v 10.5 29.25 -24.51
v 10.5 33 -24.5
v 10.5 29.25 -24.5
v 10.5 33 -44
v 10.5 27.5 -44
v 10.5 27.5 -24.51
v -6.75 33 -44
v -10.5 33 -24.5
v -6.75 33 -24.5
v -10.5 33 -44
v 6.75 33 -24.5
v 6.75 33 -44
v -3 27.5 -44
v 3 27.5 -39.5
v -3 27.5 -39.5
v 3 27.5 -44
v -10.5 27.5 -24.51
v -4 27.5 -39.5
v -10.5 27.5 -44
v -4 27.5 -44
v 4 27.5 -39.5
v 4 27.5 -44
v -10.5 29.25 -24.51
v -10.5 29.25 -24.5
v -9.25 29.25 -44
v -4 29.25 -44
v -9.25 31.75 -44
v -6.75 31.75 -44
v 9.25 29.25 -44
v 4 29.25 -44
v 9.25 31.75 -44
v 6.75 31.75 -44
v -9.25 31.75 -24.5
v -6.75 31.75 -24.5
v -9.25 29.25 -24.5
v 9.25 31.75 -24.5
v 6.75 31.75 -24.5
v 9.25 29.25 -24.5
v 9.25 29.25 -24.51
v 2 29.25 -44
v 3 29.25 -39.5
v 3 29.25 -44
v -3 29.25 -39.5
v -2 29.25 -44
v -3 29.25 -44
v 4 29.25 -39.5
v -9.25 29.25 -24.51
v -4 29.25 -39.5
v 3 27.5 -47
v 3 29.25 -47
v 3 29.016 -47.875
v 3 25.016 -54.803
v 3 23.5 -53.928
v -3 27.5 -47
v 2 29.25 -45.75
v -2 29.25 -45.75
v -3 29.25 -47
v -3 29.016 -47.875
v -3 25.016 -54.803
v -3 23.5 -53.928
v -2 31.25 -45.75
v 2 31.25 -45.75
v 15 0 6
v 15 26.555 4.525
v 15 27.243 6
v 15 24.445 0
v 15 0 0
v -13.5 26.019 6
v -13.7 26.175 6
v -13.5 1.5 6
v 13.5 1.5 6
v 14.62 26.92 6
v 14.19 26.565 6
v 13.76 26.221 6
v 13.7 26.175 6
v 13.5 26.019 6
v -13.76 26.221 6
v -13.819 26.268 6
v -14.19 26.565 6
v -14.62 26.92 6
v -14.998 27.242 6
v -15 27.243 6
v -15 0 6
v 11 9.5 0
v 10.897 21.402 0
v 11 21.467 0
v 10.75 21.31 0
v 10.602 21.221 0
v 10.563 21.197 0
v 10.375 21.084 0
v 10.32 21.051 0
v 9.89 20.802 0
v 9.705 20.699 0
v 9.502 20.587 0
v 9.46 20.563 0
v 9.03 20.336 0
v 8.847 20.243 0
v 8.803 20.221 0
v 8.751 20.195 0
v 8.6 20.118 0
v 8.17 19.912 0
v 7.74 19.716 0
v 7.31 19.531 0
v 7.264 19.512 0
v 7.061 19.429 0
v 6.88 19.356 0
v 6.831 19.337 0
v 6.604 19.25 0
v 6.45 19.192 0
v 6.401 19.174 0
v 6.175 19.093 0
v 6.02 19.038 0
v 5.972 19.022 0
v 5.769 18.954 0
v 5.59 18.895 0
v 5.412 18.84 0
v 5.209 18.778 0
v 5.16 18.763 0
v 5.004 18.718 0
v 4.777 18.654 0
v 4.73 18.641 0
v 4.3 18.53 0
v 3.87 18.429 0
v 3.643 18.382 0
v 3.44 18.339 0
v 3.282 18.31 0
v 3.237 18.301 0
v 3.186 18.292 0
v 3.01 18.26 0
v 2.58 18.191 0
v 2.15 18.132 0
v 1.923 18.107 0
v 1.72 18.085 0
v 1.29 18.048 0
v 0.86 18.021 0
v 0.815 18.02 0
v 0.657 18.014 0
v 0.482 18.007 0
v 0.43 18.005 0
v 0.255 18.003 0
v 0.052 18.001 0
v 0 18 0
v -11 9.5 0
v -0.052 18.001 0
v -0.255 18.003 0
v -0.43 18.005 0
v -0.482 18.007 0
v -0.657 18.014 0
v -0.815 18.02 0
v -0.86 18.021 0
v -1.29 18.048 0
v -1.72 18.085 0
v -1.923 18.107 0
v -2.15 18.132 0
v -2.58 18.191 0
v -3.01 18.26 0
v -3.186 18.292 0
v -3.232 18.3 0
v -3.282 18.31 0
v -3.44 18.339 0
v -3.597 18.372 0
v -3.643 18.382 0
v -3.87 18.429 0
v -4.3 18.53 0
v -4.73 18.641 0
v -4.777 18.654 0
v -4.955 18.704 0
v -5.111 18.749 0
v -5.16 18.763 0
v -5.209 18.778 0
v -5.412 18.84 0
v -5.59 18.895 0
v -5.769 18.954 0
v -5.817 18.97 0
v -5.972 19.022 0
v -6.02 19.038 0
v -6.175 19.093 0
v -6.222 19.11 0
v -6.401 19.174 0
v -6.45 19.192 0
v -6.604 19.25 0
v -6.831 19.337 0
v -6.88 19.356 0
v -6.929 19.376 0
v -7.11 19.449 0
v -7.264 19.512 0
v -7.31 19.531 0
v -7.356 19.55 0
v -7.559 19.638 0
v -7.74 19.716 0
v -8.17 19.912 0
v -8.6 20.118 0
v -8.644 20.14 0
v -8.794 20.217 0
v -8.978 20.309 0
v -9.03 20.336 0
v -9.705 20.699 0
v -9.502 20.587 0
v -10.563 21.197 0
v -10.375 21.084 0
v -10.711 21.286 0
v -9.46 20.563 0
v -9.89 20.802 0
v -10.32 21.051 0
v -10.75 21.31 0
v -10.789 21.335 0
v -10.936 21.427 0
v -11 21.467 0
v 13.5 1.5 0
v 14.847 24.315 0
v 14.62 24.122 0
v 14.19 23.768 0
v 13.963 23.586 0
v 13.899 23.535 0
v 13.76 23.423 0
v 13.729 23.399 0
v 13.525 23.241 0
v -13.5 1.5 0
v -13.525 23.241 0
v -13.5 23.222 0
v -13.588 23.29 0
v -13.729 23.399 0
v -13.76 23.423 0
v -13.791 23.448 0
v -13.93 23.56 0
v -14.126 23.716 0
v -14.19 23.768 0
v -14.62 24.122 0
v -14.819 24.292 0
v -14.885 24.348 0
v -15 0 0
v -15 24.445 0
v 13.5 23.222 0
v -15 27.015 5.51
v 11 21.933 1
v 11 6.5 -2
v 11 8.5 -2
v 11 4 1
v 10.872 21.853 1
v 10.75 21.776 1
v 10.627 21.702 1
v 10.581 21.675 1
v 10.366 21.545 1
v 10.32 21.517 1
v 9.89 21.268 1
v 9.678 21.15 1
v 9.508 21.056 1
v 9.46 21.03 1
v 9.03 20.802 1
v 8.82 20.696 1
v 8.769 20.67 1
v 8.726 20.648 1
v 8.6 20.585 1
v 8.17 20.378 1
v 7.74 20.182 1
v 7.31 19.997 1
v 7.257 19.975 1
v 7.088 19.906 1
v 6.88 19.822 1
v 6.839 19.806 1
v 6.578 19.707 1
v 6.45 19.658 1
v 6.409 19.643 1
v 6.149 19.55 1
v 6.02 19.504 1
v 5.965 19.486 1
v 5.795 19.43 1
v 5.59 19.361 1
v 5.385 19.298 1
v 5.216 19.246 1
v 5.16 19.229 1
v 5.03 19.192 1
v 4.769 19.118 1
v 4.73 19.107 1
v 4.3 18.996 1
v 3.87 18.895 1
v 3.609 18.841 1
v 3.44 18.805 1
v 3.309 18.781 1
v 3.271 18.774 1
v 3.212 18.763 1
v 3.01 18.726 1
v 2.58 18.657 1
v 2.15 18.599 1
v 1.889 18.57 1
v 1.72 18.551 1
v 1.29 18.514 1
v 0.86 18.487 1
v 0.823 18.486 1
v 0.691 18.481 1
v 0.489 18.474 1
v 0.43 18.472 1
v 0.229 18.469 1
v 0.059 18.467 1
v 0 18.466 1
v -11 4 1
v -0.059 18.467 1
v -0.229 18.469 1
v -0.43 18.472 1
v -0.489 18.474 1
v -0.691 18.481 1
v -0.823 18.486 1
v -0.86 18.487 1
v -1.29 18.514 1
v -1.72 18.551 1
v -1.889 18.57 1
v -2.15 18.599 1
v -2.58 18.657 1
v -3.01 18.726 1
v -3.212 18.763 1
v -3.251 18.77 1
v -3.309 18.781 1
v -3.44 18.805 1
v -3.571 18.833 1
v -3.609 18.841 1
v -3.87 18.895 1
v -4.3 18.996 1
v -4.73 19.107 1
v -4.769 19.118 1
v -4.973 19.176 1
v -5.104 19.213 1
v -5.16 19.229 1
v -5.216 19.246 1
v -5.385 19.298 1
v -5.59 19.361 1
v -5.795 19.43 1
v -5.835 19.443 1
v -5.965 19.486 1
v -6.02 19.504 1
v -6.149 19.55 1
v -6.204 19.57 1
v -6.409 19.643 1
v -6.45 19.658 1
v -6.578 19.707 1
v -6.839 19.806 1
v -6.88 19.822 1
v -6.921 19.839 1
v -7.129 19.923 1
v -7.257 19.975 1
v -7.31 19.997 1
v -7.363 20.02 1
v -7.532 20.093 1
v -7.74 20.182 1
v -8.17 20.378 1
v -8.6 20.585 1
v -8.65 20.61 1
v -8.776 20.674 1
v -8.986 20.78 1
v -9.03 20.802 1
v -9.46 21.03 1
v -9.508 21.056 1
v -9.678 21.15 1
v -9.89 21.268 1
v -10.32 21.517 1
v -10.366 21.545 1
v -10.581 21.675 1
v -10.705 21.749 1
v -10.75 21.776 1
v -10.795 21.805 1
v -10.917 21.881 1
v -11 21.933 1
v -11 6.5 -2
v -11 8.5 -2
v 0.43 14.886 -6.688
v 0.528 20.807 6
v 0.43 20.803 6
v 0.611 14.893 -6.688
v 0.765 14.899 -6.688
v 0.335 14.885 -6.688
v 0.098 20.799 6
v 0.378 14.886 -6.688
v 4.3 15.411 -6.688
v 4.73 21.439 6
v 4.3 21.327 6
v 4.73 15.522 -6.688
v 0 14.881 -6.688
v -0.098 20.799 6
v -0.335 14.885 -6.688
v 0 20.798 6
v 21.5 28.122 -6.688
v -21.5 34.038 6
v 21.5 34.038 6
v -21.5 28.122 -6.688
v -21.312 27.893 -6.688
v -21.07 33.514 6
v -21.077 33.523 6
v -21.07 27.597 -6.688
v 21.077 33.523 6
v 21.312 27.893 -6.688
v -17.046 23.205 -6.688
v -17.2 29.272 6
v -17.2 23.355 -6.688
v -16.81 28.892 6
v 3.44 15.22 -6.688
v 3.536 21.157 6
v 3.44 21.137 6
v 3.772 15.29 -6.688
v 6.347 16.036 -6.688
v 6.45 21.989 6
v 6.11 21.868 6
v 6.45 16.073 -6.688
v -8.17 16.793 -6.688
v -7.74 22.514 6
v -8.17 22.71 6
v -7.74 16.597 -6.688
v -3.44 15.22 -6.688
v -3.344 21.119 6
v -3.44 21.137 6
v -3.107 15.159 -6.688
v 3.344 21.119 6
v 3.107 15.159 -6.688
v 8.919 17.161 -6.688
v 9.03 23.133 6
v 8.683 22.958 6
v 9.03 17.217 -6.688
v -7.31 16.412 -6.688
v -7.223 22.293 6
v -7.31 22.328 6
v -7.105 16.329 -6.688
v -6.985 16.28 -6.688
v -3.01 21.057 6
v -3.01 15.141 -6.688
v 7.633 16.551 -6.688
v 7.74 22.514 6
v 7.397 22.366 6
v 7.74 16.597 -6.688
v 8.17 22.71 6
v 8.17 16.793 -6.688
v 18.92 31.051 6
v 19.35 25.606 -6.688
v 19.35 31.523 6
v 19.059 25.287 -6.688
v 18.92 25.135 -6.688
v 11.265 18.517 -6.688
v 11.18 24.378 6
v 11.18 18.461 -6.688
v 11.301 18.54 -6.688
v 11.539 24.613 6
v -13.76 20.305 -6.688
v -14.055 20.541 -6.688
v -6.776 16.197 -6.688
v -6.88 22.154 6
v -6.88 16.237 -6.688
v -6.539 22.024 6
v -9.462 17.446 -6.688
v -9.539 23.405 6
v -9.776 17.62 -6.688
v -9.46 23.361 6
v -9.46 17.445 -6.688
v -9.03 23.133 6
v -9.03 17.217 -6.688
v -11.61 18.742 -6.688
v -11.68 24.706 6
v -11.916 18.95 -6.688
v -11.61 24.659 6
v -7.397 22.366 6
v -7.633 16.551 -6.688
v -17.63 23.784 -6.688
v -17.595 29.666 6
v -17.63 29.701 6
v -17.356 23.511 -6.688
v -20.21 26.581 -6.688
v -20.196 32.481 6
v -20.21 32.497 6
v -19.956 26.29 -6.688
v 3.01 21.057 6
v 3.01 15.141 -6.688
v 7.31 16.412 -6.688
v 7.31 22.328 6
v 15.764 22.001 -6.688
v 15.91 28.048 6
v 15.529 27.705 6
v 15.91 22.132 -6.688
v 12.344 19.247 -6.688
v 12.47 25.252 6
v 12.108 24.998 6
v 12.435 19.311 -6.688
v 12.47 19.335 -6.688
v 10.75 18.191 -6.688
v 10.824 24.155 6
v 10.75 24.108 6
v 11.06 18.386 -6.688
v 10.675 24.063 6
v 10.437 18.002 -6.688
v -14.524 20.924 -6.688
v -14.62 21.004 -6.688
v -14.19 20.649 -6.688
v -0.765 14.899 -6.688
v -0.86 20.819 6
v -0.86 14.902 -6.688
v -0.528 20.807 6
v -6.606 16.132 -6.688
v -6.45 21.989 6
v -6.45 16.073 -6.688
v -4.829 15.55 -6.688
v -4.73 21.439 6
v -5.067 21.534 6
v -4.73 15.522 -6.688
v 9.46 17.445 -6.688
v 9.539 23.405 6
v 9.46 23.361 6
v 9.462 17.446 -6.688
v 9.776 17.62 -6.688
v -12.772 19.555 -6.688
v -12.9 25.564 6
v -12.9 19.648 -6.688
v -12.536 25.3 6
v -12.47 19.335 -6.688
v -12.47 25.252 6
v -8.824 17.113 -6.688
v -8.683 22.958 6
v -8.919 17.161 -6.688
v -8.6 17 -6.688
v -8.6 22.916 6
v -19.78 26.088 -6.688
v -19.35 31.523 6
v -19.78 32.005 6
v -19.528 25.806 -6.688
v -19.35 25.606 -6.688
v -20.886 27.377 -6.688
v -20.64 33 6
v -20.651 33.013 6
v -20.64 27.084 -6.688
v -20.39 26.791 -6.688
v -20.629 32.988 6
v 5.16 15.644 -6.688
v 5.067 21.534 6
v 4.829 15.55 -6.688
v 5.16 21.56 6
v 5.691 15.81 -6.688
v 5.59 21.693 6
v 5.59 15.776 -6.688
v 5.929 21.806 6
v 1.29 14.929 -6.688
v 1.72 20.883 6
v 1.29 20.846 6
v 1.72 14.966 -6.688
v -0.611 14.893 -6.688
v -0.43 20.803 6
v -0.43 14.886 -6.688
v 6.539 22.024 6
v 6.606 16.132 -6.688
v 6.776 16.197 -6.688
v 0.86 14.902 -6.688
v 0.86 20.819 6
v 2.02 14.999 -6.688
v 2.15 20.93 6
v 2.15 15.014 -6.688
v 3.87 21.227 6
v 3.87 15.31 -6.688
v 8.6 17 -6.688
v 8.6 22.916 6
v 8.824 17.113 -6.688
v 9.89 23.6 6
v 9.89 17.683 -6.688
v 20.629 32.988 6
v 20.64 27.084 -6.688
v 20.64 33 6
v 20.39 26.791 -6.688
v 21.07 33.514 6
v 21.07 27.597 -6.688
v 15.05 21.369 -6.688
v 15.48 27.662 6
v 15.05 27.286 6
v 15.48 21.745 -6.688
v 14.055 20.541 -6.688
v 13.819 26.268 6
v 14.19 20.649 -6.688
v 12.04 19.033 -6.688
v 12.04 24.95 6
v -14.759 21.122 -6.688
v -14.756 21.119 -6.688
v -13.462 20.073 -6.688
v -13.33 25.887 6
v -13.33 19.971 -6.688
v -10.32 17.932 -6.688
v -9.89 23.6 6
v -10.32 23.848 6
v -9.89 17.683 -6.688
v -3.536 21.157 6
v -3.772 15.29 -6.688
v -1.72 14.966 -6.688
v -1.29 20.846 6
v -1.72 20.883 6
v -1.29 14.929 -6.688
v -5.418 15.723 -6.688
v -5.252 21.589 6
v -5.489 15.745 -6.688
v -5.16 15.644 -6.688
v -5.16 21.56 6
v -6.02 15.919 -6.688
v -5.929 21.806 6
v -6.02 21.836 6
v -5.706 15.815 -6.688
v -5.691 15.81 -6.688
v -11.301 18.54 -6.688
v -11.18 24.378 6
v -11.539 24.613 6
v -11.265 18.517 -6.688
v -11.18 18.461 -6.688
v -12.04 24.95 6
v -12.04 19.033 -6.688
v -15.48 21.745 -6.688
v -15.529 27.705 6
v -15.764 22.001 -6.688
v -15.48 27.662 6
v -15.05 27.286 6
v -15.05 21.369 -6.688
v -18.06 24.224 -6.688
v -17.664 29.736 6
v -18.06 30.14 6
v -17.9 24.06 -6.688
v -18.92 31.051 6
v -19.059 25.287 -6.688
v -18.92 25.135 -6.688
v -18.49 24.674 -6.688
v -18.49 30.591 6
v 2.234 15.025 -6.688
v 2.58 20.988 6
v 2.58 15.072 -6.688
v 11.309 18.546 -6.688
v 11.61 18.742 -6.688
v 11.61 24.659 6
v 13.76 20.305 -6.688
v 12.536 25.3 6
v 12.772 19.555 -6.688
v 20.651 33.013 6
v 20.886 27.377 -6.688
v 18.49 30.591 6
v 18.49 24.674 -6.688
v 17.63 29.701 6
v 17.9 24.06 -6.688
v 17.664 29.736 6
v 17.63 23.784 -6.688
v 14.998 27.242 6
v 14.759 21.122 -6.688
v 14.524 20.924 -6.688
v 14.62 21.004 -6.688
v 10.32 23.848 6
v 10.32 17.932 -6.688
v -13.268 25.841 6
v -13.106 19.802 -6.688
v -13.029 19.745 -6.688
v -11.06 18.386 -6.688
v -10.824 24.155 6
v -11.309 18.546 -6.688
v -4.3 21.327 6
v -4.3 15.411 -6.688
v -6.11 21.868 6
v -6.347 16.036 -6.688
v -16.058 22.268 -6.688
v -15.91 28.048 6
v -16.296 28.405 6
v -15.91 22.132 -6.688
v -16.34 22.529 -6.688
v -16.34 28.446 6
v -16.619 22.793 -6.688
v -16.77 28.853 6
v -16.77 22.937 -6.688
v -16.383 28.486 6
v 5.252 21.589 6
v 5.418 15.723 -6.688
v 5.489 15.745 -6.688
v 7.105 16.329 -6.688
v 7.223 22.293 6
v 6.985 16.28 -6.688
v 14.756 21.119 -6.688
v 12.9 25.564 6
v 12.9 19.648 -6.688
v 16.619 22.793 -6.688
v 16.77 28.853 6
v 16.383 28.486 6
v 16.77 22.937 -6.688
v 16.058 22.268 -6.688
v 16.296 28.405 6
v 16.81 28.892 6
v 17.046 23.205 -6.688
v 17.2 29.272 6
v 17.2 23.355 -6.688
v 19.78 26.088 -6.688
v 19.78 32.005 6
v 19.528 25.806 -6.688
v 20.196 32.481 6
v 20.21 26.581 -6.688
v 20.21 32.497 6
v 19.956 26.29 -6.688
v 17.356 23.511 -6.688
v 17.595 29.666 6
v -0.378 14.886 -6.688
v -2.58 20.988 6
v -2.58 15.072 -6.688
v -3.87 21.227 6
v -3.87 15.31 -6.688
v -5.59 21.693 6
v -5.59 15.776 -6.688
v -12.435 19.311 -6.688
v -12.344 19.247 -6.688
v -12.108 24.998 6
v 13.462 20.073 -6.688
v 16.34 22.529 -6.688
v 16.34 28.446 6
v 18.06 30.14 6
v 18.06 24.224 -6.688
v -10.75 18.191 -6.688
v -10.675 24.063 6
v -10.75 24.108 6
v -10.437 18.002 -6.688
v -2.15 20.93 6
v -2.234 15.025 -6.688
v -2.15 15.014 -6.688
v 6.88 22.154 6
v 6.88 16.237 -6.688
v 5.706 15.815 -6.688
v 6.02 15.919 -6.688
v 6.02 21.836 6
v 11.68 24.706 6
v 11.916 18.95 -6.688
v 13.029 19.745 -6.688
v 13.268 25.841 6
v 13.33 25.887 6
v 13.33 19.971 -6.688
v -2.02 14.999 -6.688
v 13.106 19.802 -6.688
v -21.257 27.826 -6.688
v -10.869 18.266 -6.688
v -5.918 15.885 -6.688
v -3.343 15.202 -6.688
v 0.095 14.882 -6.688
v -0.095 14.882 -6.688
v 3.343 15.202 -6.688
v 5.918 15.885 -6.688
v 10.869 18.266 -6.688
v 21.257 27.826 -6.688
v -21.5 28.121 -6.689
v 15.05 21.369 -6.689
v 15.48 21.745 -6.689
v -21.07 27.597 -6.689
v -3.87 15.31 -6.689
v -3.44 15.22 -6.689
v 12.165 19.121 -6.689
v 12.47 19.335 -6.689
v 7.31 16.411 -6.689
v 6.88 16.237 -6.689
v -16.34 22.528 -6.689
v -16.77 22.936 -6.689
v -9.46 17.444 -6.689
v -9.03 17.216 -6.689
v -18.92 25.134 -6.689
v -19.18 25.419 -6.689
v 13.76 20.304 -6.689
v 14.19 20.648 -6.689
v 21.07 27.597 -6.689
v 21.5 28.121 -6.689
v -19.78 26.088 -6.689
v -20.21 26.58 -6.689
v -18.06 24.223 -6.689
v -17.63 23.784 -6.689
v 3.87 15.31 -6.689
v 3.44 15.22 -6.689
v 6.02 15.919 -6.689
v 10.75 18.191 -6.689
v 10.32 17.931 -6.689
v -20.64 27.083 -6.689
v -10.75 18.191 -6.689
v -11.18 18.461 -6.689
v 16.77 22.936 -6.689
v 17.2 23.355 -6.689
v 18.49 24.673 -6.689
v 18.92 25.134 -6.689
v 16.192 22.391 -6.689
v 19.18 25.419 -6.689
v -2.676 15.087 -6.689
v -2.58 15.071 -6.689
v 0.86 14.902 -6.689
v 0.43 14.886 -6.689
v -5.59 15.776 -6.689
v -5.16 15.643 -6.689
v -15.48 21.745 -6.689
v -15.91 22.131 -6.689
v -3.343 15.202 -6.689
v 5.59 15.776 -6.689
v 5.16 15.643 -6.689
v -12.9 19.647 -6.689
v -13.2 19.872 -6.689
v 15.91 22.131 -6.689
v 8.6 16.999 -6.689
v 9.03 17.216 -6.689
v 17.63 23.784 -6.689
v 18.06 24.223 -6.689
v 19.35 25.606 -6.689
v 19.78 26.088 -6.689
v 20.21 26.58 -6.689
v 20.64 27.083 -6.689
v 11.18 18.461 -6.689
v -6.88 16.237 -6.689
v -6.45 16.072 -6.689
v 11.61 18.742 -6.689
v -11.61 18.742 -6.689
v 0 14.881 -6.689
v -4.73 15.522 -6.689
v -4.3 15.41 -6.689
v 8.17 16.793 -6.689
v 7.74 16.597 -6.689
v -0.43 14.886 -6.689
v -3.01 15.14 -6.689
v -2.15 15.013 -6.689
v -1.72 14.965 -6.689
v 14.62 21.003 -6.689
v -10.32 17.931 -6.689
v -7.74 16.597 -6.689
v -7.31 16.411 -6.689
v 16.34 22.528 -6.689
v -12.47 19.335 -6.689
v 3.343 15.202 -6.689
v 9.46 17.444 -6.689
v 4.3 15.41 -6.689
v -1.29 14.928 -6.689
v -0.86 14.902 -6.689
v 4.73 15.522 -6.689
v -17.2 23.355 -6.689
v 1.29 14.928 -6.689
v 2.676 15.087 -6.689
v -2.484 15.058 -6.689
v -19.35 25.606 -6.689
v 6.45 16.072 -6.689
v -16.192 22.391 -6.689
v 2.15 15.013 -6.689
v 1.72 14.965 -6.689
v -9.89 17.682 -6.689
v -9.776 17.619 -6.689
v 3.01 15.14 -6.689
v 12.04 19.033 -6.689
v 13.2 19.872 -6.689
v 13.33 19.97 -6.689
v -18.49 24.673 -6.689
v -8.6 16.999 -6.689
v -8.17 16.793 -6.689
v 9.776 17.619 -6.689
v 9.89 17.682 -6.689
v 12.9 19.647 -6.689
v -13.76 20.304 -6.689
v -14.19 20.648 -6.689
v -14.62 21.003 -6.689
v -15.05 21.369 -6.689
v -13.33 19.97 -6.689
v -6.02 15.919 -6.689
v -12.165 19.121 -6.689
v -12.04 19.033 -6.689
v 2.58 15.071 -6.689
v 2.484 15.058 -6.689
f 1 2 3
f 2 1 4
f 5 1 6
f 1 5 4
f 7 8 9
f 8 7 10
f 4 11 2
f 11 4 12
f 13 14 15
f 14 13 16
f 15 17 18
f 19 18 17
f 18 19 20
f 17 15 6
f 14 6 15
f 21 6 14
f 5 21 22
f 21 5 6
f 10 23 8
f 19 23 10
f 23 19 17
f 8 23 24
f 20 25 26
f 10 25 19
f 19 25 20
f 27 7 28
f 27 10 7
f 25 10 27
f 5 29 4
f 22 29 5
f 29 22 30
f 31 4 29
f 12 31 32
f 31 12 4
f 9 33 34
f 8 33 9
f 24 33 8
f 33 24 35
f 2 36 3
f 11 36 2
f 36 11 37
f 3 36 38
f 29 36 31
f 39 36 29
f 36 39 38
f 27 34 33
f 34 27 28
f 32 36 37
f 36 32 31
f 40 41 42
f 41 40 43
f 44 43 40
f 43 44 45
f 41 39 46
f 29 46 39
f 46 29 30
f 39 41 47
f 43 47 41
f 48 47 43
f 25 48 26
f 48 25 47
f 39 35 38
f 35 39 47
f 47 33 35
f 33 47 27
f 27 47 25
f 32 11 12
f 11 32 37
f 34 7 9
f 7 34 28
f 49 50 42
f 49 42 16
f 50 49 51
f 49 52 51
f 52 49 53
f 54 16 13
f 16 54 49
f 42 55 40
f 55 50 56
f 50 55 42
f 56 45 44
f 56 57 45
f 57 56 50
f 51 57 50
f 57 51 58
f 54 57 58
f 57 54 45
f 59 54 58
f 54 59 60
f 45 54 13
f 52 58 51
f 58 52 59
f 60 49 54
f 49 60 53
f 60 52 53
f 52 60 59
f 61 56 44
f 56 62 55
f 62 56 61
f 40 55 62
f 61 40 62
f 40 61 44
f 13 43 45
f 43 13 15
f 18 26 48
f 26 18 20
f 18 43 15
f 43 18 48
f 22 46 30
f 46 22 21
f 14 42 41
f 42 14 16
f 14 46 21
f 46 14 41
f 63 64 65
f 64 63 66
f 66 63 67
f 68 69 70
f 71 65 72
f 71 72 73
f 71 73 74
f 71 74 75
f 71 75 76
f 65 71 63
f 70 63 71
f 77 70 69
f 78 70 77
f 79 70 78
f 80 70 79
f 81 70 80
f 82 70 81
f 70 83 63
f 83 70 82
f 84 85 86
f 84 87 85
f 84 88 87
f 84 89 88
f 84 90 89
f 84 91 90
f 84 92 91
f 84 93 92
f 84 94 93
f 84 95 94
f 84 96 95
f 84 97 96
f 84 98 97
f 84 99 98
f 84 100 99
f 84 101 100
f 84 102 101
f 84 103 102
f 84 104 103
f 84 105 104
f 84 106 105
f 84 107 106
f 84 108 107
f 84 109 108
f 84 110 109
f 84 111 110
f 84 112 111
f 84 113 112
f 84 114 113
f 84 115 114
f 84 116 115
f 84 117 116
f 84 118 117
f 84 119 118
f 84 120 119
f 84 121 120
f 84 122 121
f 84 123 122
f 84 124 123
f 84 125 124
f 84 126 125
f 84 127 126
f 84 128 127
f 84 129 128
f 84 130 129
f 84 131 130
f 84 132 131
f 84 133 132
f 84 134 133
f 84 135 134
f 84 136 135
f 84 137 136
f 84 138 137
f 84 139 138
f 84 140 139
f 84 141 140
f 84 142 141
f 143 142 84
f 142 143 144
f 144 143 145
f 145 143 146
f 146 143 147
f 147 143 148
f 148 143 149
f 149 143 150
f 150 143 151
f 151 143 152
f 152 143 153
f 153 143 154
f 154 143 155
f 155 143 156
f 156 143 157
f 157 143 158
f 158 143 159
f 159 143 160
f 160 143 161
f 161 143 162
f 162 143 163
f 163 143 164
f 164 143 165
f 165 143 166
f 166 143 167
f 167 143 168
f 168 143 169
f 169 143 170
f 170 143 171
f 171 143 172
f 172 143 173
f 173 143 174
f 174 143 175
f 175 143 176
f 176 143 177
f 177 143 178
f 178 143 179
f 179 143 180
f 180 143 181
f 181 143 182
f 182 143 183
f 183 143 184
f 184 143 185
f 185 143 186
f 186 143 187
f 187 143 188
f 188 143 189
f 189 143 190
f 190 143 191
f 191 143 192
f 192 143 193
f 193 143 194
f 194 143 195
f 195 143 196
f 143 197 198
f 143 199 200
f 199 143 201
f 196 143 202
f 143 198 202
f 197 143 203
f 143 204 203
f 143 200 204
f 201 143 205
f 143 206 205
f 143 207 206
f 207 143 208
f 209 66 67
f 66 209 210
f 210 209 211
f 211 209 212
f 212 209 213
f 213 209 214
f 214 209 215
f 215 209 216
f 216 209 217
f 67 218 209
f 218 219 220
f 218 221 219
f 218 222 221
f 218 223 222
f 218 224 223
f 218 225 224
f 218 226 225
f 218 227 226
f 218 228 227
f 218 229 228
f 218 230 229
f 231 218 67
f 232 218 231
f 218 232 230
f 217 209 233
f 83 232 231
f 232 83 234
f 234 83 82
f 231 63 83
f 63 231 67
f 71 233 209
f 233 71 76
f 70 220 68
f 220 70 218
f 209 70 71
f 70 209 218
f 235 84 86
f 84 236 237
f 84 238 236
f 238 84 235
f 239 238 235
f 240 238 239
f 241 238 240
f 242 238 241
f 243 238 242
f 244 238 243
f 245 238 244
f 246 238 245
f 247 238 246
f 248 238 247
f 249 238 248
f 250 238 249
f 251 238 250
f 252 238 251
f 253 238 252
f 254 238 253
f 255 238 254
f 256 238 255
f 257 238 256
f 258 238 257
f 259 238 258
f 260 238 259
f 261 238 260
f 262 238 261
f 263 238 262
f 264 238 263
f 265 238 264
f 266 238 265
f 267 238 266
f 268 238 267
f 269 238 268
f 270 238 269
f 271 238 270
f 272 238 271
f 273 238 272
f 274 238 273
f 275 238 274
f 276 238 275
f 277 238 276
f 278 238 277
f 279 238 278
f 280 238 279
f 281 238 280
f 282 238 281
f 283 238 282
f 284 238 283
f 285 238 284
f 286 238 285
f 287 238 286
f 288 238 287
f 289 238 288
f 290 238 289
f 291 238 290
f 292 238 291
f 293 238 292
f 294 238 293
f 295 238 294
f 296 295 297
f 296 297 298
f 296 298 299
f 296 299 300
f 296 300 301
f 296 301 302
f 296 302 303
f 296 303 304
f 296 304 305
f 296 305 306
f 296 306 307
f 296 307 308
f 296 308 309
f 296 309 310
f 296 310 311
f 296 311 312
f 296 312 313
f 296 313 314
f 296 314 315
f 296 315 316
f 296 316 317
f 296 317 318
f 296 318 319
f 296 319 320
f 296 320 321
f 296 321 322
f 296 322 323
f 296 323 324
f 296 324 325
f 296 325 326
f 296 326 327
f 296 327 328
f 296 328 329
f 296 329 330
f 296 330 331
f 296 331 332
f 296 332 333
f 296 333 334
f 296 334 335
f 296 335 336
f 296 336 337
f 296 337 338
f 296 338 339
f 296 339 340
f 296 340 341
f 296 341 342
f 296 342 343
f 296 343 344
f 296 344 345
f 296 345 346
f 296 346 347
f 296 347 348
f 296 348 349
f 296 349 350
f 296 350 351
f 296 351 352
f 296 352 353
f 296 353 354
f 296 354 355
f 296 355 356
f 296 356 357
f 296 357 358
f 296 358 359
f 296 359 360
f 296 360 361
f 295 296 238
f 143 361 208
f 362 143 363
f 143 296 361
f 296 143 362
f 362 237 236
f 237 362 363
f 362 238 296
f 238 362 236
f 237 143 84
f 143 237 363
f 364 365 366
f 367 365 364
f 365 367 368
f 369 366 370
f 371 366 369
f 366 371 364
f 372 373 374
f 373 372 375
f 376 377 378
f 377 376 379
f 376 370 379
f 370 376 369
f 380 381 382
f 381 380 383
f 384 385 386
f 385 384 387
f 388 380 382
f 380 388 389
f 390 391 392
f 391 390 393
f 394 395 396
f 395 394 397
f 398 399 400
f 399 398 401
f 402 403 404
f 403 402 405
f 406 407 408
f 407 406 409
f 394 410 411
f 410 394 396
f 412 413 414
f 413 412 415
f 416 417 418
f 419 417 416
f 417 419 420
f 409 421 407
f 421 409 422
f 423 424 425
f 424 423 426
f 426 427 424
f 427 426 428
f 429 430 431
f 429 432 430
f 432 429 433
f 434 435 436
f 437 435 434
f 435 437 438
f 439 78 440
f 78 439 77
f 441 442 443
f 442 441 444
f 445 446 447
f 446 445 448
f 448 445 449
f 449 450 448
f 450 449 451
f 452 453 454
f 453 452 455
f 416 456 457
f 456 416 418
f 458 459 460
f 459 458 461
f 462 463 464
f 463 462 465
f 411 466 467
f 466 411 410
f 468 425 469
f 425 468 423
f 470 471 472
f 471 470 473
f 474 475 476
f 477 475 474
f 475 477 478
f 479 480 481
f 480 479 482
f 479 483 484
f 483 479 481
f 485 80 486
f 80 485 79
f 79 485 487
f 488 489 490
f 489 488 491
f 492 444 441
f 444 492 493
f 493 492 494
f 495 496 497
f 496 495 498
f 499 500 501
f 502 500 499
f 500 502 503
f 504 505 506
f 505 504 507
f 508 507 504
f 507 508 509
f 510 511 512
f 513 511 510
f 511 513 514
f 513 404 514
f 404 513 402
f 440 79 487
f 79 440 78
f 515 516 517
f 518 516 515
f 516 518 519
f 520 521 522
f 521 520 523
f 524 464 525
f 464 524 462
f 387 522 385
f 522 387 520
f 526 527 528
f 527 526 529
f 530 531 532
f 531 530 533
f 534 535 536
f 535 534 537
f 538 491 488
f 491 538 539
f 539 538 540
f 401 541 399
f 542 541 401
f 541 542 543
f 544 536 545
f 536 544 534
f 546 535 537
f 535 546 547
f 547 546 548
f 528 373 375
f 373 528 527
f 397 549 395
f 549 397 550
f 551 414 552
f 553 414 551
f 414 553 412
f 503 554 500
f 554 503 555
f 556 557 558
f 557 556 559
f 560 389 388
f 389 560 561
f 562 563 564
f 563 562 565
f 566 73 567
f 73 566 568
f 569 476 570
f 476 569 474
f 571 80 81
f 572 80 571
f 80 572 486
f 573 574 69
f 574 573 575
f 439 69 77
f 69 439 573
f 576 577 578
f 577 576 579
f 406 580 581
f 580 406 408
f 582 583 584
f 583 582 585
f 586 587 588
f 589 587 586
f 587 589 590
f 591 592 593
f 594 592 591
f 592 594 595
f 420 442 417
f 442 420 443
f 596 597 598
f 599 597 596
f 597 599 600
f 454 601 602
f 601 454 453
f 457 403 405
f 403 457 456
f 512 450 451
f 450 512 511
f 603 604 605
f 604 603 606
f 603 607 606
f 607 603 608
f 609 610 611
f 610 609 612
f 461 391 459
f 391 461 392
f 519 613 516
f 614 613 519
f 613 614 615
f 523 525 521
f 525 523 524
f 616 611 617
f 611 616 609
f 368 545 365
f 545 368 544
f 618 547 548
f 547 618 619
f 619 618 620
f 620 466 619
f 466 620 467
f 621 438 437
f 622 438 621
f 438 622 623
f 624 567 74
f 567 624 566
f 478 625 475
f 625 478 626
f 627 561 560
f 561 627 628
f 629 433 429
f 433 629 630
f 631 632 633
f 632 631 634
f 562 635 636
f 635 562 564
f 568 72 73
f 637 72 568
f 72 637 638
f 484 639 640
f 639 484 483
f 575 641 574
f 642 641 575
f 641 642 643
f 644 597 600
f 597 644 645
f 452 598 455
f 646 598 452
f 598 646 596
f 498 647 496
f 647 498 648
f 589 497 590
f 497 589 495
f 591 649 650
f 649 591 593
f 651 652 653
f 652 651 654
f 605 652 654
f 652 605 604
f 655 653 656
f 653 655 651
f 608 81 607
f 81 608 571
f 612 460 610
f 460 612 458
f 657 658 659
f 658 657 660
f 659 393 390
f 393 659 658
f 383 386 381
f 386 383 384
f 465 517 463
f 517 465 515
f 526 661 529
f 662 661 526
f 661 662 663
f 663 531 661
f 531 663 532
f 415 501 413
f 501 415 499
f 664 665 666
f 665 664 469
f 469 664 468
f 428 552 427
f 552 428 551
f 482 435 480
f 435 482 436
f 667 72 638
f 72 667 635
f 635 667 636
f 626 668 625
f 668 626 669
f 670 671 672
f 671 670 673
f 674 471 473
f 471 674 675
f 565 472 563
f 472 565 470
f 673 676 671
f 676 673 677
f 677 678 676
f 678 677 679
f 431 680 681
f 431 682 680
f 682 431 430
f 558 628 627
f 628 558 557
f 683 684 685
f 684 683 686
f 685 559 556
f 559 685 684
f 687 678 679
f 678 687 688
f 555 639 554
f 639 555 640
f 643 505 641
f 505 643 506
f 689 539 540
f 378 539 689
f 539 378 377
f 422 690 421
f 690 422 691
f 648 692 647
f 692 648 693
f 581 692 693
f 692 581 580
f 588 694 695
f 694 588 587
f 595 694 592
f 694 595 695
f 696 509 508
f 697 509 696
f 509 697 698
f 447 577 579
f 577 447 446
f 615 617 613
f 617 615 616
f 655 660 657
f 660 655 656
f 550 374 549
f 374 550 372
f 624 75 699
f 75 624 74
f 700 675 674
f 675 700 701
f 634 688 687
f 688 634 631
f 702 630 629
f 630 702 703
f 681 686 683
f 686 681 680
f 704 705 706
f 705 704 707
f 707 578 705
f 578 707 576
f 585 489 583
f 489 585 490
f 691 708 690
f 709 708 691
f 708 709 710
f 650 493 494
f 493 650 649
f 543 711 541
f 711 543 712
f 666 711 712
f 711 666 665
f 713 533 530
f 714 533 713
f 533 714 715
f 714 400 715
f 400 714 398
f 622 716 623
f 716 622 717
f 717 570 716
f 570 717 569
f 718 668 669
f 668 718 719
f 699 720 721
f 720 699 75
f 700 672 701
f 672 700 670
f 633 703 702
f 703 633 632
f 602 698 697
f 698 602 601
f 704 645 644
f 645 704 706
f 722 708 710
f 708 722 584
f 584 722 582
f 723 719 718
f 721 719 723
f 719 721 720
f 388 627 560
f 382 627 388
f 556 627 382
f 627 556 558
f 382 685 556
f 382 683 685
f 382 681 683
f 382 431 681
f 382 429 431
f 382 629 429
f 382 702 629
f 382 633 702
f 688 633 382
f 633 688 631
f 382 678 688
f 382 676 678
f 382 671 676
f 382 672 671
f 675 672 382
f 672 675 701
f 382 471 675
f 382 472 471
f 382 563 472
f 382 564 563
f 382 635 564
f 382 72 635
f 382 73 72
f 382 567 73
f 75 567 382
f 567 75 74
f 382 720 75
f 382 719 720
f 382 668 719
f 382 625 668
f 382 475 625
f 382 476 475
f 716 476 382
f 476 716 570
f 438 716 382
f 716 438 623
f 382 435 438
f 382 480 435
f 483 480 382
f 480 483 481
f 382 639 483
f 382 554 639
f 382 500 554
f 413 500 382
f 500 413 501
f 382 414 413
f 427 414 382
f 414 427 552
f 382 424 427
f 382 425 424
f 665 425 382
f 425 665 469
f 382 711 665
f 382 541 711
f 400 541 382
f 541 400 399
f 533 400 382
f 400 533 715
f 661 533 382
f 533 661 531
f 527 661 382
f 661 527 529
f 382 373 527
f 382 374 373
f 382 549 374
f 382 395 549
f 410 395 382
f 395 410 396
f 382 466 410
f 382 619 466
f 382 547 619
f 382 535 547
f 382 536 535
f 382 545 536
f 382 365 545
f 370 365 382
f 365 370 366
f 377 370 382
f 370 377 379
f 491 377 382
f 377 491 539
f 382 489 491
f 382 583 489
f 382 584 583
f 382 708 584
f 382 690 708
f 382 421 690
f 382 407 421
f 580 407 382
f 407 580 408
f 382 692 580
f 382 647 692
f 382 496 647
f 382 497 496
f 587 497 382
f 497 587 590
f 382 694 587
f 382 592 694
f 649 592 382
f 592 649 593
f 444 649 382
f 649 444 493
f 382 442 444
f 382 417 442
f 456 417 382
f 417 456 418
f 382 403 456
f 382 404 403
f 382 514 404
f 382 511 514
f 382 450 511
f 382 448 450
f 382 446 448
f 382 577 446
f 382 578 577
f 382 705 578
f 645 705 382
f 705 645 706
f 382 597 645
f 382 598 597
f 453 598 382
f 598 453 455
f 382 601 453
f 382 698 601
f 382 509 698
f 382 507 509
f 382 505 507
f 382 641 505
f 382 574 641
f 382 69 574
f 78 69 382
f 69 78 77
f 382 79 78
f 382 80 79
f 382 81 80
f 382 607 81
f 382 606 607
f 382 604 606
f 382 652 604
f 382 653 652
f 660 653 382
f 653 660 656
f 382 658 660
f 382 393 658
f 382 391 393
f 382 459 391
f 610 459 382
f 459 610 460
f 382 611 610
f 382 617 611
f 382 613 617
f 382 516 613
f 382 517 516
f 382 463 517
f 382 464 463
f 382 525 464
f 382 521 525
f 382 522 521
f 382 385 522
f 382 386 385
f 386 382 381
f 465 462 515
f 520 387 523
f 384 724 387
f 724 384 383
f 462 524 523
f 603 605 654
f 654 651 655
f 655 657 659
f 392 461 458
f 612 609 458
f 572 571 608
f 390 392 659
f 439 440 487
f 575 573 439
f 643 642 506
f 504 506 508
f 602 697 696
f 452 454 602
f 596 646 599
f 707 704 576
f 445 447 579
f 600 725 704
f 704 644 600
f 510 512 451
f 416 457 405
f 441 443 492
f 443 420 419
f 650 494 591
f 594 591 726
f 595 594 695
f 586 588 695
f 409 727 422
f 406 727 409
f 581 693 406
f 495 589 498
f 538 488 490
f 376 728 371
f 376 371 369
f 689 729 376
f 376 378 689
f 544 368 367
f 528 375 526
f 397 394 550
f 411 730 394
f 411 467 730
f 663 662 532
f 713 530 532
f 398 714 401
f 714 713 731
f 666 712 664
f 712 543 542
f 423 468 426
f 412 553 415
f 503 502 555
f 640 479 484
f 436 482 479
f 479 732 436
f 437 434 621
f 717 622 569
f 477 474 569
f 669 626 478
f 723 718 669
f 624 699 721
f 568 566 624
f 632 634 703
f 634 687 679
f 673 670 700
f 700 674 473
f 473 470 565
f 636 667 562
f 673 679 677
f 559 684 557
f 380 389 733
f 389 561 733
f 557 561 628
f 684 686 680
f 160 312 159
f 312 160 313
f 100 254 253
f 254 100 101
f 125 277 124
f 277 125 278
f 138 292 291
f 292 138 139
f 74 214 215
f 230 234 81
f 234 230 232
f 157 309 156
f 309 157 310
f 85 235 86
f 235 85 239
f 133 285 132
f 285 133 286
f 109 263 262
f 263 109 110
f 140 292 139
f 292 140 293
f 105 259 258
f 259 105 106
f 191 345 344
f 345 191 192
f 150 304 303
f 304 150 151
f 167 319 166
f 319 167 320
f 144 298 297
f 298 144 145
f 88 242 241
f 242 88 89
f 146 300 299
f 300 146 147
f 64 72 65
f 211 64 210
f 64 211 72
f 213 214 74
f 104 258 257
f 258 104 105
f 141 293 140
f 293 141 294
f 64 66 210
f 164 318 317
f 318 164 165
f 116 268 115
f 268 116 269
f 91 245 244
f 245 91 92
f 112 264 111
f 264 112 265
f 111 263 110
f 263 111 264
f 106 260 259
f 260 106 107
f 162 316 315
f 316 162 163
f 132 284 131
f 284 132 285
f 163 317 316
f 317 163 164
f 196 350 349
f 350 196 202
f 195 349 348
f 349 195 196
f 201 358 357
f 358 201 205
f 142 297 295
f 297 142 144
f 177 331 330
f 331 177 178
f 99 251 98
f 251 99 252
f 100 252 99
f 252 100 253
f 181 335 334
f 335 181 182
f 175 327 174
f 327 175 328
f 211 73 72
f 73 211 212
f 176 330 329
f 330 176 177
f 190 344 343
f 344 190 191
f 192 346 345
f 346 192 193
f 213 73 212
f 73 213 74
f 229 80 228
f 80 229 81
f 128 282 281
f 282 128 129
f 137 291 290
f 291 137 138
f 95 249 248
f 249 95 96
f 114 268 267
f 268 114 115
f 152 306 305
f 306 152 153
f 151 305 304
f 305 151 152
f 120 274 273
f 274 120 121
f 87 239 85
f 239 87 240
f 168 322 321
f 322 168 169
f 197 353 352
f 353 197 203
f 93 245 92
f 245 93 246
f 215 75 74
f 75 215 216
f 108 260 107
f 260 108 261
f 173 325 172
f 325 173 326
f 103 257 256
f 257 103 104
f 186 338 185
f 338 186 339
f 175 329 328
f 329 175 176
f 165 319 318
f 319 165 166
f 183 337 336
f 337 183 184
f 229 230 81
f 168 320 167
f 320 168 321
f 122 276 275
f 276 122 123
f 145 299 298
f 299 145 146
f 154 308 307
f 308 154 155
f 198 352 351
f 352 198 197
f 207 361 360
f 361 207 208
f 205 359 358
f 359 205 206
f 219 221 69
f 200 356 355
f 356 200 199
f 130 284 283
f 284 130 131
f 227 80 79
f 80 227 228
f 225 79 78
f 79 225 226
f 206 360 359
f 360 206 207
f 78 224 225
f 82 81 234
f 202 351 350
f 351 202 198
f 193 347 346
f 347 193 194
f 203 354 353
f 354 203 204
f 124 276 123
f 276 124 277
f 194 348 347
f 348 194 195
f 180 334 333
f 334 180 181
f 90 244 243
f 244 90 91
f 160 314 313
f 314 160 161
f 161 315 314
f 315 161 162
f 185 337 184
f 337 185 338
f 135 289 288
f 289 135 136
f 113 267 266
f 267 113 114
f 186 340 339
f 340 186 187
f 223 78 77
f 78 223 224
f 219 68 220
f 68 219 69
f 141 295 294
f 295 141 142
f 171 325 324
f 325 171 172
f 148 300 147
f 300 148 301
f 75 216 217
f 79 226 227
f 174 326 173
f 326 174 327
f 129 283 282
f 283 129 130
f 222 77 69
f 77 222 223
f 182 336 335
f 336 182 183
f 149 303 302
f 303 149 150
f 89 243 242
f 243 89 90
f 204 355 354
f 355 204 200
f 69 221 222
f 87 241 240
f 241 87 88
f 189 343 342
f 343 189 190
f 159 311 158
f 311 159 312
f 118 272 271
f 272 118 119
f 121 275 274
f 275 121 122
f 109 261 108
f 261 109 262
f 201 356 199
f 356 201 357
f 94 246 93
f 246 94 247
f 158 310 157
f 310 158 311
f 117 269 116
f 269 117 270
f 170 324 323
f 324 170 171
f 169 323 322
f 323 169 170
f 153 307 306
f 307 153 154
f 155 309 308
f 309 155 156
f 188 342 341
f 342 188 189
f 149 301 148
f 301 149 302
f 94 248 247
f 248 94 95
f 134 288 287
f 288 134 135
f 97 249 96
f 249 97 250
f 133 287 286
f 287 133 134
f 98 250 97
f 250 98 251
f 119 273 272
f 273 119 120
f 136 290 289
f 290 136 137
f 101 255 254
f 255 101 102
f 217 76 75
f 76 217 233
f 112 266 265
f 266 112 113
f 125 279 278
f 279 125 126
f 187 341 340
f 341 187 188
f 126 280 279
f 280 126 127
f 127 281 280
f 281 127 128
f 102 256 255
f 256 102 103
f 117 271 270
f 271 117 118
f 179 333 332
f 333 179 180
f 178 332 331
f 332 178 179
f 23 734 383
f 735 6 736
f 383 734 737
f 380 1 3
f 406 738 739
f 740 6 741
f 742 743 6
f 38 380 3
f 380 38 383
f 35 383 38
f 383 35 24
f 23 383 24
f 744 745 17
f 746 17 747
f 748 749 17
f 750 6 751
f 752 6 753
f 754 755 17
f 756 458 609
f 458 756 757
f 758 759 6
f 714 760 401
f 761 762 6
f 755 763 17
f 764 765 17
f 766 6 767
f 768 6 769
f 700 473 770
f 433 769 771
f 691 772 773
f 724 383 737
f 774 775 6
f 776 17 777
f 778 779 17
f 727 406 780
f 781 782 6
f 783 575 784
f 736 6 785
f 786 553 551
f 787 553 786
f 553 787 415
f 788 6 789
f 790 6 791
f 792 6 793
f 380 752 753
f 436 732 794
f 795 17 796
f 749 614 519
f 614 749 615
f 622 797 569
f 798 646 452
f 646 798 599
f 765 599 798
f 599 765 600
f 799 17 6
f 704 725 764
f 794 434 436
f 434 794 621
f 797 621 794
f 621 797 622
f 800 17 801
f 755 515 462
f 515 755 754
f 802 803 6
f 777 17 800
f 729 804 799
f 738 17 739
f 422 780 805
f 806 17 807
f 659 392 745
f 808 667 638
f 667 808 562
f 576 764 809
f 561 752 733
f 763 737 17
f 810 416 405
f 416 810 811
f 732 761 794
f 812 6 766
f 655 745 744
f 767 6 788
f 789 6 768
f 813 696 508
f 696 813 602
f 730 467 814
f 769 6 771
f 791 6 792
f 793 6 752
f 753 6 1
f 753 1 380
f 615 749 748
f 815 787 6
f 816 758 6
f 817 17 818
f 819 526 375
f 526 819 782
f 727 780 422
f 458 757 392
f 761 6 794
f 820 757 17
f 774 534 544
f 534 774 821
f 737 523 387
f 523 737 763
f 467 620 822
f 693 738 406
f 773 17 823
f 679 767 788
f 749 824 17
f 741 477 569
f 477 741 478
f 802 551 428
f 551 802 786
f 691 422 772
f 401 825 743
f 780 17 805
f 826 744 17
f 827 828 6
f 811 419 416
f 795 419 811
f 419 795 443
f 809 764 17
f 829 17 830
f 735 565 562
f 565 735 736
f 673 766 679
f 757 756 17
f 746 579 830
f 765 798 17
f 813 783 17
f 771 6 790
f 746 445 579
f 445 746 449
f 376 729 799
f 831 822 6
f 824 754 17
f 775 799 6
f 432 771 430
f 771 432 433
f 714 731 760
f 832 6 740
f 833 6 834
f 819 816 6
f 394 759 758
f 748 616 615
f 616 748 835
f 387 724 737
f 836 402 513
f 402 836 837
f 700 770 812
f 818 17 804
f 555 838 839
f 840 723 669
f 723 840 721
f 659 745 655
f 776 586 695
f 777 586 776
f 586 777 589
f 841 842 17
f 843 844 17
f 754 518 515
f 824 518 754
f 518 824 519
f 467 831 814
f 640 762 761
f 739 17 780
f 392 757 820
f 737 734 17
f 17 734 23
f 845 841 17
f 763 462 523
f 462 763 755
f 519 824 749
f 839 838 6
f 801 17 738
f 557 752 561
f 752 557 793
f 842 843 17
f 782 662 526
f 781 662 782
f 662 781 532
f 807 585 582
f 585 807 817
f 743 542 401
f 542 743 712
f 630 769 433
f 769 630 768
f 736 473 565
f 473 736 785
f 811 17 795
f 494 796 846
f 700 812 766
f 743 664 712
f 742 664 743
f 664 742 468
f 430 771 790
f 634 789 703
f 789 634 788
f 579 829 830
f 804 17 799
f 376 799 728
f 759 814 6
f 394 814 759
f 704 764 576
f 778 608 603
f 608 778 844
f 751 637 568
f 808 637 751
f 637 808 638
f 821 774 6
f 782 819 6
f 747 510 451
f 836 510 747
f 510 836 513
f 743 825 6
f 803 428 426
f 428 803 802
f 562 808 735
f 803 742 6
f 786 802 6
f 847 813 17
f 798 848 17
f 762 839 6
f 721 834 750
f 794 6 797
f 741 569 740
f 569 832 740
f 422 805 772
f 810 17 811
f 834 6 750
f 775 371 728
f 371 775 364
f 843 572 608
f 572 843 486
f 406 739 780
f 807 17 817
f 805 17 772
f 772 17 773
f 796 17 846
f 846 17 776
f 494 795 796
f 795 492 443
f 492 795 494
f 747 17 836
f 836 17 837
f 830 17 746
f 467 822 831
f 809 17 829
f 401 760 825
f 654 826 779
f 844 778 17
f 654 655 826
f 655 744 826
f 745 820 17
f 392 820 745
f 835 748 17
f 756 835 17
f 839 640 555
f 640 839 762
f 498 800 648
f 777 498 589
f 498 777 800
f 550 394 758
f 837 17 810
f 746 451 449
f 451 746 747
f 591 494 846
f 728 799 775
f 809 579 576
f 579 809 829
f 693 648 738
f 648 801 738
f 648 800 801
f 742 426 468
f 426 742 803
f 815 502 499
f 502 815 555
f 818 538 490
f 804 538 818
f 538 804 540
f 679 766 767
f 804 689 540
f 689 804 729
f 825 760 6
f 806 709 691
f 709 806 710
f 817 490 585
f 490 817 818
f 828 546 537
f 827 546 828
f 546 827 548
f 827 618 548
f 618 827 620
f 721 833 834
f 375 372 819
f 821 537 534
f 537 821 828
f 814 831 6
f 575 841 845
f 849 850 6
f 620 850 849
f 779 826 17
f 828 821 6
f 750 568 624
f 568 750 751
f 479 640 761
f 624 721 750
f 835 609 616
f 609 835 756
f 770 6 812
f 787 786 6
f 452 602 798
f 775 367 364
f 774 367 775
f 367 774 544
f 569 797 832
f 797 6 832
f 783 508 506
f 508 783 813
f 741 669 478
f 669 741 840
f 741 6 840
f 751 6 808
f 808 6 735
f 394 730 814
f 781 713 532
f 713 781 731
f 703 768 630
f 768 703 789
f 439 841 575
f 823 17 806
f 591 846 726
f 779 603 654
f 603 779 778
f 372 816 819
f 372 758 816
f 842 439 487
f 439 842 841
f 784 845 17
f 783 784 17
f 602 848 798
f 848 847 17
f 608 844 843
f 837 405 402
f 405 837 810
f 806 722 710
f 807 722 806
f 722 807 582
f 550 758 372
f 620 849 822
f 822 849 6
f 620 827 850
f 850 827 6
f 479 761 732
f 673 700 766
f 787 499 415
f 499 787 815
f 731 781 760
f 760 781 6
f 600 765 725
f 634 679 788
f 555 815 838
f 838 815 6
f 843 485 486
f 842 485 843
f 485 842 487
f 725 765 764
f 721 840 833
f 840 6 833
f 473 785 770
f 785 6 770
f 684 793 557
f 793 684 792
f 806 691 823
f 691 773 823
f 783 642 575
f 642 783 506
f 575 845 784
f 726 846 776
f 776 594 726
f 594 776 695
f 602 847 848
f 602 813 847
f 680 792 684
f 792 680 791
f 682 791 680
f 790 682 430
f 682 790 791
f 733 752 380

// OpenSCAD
// file: parabolic_cylinder.scad
module parabolic_cylinder(width, height, depth) {
    // a * (width / 2)^2 = height
    a = 4 * height / (width * width);

    function f(x) = a * x * x;

    // autogenerated with:
    // val lines = (-50 to 50) map {
    //   x: Int => "[width / 100 * " + x + ", f(width / 100 * " + x + ")]"
    // }
    // println (lines.mkString(",\n            "))

    translate([0,0,-depth])
    linear_extrude(depth * 2) {
        polygon([
            [width / 100 * -50, f(width / 100 * -50)],
            [width / 100 * -49, f(width / 100 * -49)],
            [width / 100 * -48, f(width / 100 * -48)],
            [width / 100 * -47, f(width / 100 * -47)],
            [width / 100 * -46, f(width / 100 * -46)],
            [width / 100 * -45, f(width / 100 * -45)],
            [width / 100 * -44, f(width / 100 * -44)],
            [width / 100 * -43, f(width / 100 * -43)],
            [width / 100 * -42, f(width / 100 * -42)],
            [width / 100 * -41, f(width / 100 * -41)],
            [width / 100 * -40, f(width / 100 * -40)],
            [width / 100 * -39, f(width / 100 * -39)],
            [width / 100 * -38, f(width / 100 * -38)],
            [width / 100 * -37, f(width / 100 * -37)],
            [width / 100 * -36, f(width / 100 * -36)],
            [width / 100 * -35, f(width / 100 * -35)],
            [width / 100 * -34, f(width / 100 * -34)],
            [width / 100 * -33, f(width / 100 * -33)],
            [width / 100 * -32, f(width / 100 * -32)],
            [width / 100 * -31, f(width / 100 * -31)],
            [width / 100 * -30, f(width / 100 * -30)],
            [width / 100 * -29, f(width / 100 * -29)],
            [width / 100 * -28, f(width / 100 * -28)],
            [width / 100 * -27, f(width / 100 * -27)],
            [width / 100 * -26, f(width / 100 * -26)],
            [width / 100 * -25, f(width / 100 * -25)],
            [width / 100 * -24, f(width / 100 * -24)],
            [width / 100 * -23, f(width / 100 * -23)],
            [width / 100 * -22, f(width / 100 * -22)],
            [width / 100 * -21, f(width / 100 * -21)],
            [width / 100 * -20, f(width / 100 * -20)],
            [width / 100 * -19, f(width / 100 * -19)],
            [width / 100 * -18, f(width / 100 * -18)],
            [width / 100 * -17, f(width / 100 * -17)],
            [width / 100 * -16, f(width / 100 * -16)],
            [width / 100 * -15, f(width / 100 * -15)],
            [width / 100 * -14, f(width / 100 * -14)],
            [width / 100 * -13, f(width / 100 * -13)],
            [width / 100 * -12, f(width / 100 * -12)],
            [width / 100 * -11, f(width / 100 * -11)],
            [width / 100 * -10, f(width / 100 * -10)],
            [width / 100 * -9, f(width / 100 * -9)],
            [width / 100 * -8, f(width / 100 * -8)],
            [width / 100 * -7, f(width / 100 * -7)],
            [width / 100 * -6, f(width / 100 * -6)],
            [width / 100 * -5, f(width / 100 * -5)],
            [width / 100 * -4, f(width / 100 * -4)],
            [width / 100 * -3, f(width / 100 * -3)],
            [width / 100 * -2, f(width / 100 * -2)],
            [width / 100 * -1, f(width / 100 * -1)],
            [width / 100 * 0, f(width / 100 * 0)],
            [width / 100 * 1, f(width / 100 * 1)],
            [width / 100 * 2, f(width / 100 * 2)],
            [width / 100 * 3, f(width / 100 * 3)],
            [width / 100 * 4, f(width / 100 * 4)],
            [width / 100 * 5, f(width / 100 * 5)],
            [width / 100 * 6, f(width / 100 * 6)],
            [width / 100 * 7, f(width / 100 * 7)],
            [width / 100 * 8, f(width / 100 * 8)],
            [width / 100 * 9, f(width / 100 * 9)],
            [width / 100 * 10, f(width / 100 * 10)],
            [width / 100 * 11, f(width / 100 * 11)],
            [width / 100 * 12, f(width / 100 * 12)],
            [width / 100 * 13, f(width / 100 * 13)],
            [width / 100 * 14, f(width / 100 * 14)],
            [width / 100 * 15, f(width / 100 * 15)],
            [width / 100 * 16, f(width / 100 * 16)],
            [width / 100 * 17, f(width / 100 * 17)],
            [width / 100 * 18, f(width / 100 * 18)],
            [width / 100 * 19, f(width / 100 * 19)],
            [width / 100 * 20, f(width / 100 * 20)],
            [width / 100 * 21, f(width / 100 * 21)],
            [width / 100 * 22, f(width / 100 * 22)],
            [width / 100 * 23, f(width / 100 * 23)],
            [width / 100 * 24, f(width / 100 * 24)],
            [width / 100 * 25, f(width / 100 * 25)],
            [width / 100 * 26, f(width / 100 * 26)],
            [width / 100 * 27, f(width / 100 * 27)],
            [width / 100 * 28, f(width / 100 * 28)],
            [width / 100 * 29, f(width / 100 * 29)],
            [width / 100 * 30, f(width / 100 * 30)],
            [width / 100 * 31, f(width / 100 * 31)],
            [width / 100 * 32, f(width / 100 * 32)],
            [width / 100 * 33, f(width / 100 * 33)],
            [width / 100 * 34, f(width / 100 * 34)],
            [width / 100 * 35, f(width / 100 * 35)],
            [width / 100 * 36, f(width / 100 * 36)],
            [width / 100 * 37, f(width / 100 * 37)],
            [width / 100 * 38, f(width / 100 * 38)],
            [width / 100 * 39, f(width / 100 * 39)],
            [width / 100 * 40, f(width / 100 * 40)],
            [width / 100 * 41, f(width / 100 * 41)],
            [width / 100 * 42, f(width / 100 * 42)],
            [width / 100 * 43, f(width / 100 * 43)],
            [width / 100 * 44, f(width / 100 * 44)],
            [width / 100 * 45, f(width / 100 * 45)],
            [width / 100 * 46, f(width / 100 * 46)],
            [width / 100 * 47, f(width / 100 * 47)],
            [width / 100 * 48, f(width / 100 * 48)],
            [width / 100 * 49, f(width / 100 * 49)],
            [width / 100 * 50, f(width / 100 * 50)]
        ]);
    }
}
// file: fizik_ics.scad
/* fizik ics clip */

use <parabolic_cylinder.scad>;

ics_width = 30.0;
ics_min_depth = 18.0;
ics_max_depth = ics_min_depth * 1.8;
ics_height = 6.0;

ics_wall_thickness = 1.5;

ics_clip_width = 22;
ics_clip_thickness = 1.0;

/*
 *             b
 *            ___
 *         a /   \ c
 *          /     \
 *  -------/       \
 *  -----------------
 */

ics_clip_protrusion = 2.0;
ics_clip_length_a = 1.0;
ics_clip_length_b = 2.0;
ics_clip_length_c = 2.5;

// distance from the clip to the inside of the frame wall
ics_clip_separation = 2.5;

// width/depth are post-rotate, height is pre-rotate
ics_stop_angle = 25.0;
ics_stop_width = 43.0;
ics_stop_depth = 12.0;
ics_stop_length = 14.0;
ics_stop_height = cos(ics_stop_angle) * ics_stop_length;

module ics_frame() {
    // outer frame
    difference() {
        cube([ics_width, ics_max_depth, ics_height]);
        translate([ics_wall_thickness, ics_wall_thickness, 0]) {
            cube([ics_width - 2 * ics_wall_thickness, ics_max_depth - 2 * ics_wall_thickness, ics_height * 2]);
        }
    }
}

module ics_clip() {
    width_space = (ics_width - ics_clip_width - 2 * ics_wall_thickness) / 2;

    x_shift = ics_wall_thickness + width_space;
    y_shift = ics_wall_thickness + ics_clip_separation;
    translate([x_shift, y_shift, 0]) {
        union() {
            // Remove the part that conflicts with the ramp
            difference() {
                cube([ics_clip_width, ics_max_depth - y_shift, ics_clip_thickness]);
                cube([ics_clip_width, ics_clip_length_a + ics_clip_length_b + ics_clip_length_c, ics_clip_thickness]);
            };

            rotate([90, 0, 0])
            rotate([0, 90, 0])
            linear_extrude(ics_clip_width) {
                polygon([
                    [0, ics_clip_thickness],
                    [ics_clip_length_c, -ics_clip_protrusion],
                    [ics_clip_length_c + ics_clip_length_b, -ics_clip_protrusion],
                    [ics_clip_length_c + ics_clip_length_b + ics_clip_length_a, 0 ],
                    [ics_clip_length_c + ics_clip_length_b + ics_clip_length_a, ics_clip_thickness],
                ]);
            };
        }
    }
}

module ics_stop_mask(sh) {
    // FIXME: Make this an extrude of the actual shape
    translate([(ics_width - ics_stop_width) / 2, 0, ics_height-sh]) {
        cube([ics_stop_width, ics_max_depth * 2, sh]);
    }
}

module ics_stop_solid(sh) {
    // Model the end as a tilted paraboloid
    intersection() {
        translate([ics_width / 2, ics_min_depth - ics_height * tan(ics_stop_angle), -ics_height])
        rotate([-ics_stop_angle, 0, 0])
        translate([0,0,sh/2])
        parabolic_cylinder(ics_stop_width, ics_stop_depth, sh);
        ics_stop_mask(sh);
    }
}

module ics_stop(sh, wt = ics_wall_thickness, hollow = false) {
    difference() {
        ics_stop_solid(sh);
        if (hollow) {
            translate([0, wt / cos(ics_stop_angle) , 0]) {
                ics_stop_solid(sh);
            }
        }
    }
}

module fizik_ics() {
    translate([-ics_width/2, 0, 0])
    union() {
        difference() {
            union() {
                ics_frame();
                ics_clip();
            }

            // mask off the end
            hull() {
                ics_stop_solid(ics_stop_height);
                translate([0, ics_max_depth, 0]) {
                    cube([ics_width, 1, ics_height]);
                }
            }
        }

        ics_stop(ics_stop_height, ics_wall_thickness);
    }
}
// file: axiom_bracket.scad
// mounting bracket for axiom pulse 60
ax_body_height = 19.5;
ax_body_width = 21;
// this should really be 5.0, but my printer, the form 1, prints the back and rail too thick
ax_body_depth = 5.5;

ax_back_thickness = 1.75;
ax_side_thickness = 1.25;
ax_rail_thickness = 1.25;
ax_rail_width = 3.75;

ax_latch_length = 1.75;
ax_latch_width = 4.0;
// stock is 1.25, bumped up by .75 to more securely retain
ax_latch_height = 2.0;

ax_release_cutout_width = 1.0;
ax_release_cutout_length = 4.5;
ax_release_angle = 30;
ax_release_width = 6.0;
ax_release_flat_length = 3.0;
ax_release_angled_length = 8.0;

module ax_body_top() {
    translate([-ax_body_width / 2, 0, ax_body_width / 2])
    rotate([-90, 0, 0])
    intersection() {
        cube([ax_body_width, 0.01, ax_back_thickness]);
        ax_body();
    }
}

module ax_body() {
    difference() {
        cube([ax_body_width, ax_body_height, ax_body_depth]);
        translate([ax_side_thickness, 0, ax_back_thickness])
            cube([ax_body_width - 2 * ax_side_thickness, ax_body_height, ax_body_depth - ax_back_thickness - ax_rail_thickness]);
        translate([ax_rail_width, 0, ax_body_depth - ax_rail_thickness])
            cube([ax_body_width - 2 * ax_rail_width, ax_body_height, ax_rail_thickness]);
    }
}

module ax_release() {
    union() {
        hull() {
            translate([(ax_body_width - ax_release_width) / 2, ax_body_height, 0])
            cube([ax_release_width, ax_release_flat_length, ax_back_thickness]);

            // Use hull() with a short length version of the angled part to fill in the gap
            translate([(ax_body_width - ax_release_width) / 2, ax_body_height + ax_release_flat_length, 0])
            rotate([-ax_release_angle, 0, 0])
            cube([ax_release_width, 0.0001, ax_back_thickness]);
        }

        translate([(ax_body_width - ax_release_width) / 2, ax_body_height + ax_release_flat_length, 0])
        rotate([-ax_release_angle, 0, 0])
        cube([ax_release_width, ax_release_angled_length, ax_back_thickness]);
    }
}

module ax_release_cutout() {
    union() {
        translate([(ax_body_width - ax_release_width) / 2 - ax_release_cutout_width, ax_body_height - ax_release_cutout_length, 0])
        cube([ax_release_cutout_width, ax_release_cutout_length, ax_back_thickness]);

        translate([(ax_body_width + ax_release_width) / 2, ax_body_height - ax_release_cutout_length, 0])
        cube([ax_release_cutout_width, ax_release_cutout_length, ax_back_thickness]);
    }
}

module ax_latch() {
    translate([(ax_body_width - ax_latch_width) / 2, ax_body_height, ax_back_thickness])
    rotate([90,0,90])
    linear_extrude(ax_latch_width) {
        polygon([
            [0, 0],
            [ax_latch_length, ax_latch_height],
            [ax_latch_length, 0]
        ]);
    }
}

module axiom_bracket() {
    translate([-ax_body_width / 2, 0, ax_body_width / 2])
    rotate([-90, 0, 0])
    union() {
        difference() {
            union() {
                ax_body();
                ax_release();
                ax_latch();
            }
            ax_release_cutout();
        }
        ax_latch();
    }
}
// main file
include <axiom_bracket.scad>;
include <fizik_ics.scad>;

axiom_x = 0;
axiom_y = 27.5;
axiom_z = -35;

union() {
	translate([axiom_x, axiom_y, axiom_z])
	axiom_bracket();

	hull() {
    	translate([-ics_width/2, 0, 0])
		intersection() {
			ics_stop(ics_stop_height + 0.001);
			translate([-50,0,ics_height - ics_stop_height - 0.001])
			cube([100, 100, 0.001]);
		}

		translate([axiom_x, axiom_y, axiom_z])
		ax_body_top();


	}
	fizik_ics();
}
